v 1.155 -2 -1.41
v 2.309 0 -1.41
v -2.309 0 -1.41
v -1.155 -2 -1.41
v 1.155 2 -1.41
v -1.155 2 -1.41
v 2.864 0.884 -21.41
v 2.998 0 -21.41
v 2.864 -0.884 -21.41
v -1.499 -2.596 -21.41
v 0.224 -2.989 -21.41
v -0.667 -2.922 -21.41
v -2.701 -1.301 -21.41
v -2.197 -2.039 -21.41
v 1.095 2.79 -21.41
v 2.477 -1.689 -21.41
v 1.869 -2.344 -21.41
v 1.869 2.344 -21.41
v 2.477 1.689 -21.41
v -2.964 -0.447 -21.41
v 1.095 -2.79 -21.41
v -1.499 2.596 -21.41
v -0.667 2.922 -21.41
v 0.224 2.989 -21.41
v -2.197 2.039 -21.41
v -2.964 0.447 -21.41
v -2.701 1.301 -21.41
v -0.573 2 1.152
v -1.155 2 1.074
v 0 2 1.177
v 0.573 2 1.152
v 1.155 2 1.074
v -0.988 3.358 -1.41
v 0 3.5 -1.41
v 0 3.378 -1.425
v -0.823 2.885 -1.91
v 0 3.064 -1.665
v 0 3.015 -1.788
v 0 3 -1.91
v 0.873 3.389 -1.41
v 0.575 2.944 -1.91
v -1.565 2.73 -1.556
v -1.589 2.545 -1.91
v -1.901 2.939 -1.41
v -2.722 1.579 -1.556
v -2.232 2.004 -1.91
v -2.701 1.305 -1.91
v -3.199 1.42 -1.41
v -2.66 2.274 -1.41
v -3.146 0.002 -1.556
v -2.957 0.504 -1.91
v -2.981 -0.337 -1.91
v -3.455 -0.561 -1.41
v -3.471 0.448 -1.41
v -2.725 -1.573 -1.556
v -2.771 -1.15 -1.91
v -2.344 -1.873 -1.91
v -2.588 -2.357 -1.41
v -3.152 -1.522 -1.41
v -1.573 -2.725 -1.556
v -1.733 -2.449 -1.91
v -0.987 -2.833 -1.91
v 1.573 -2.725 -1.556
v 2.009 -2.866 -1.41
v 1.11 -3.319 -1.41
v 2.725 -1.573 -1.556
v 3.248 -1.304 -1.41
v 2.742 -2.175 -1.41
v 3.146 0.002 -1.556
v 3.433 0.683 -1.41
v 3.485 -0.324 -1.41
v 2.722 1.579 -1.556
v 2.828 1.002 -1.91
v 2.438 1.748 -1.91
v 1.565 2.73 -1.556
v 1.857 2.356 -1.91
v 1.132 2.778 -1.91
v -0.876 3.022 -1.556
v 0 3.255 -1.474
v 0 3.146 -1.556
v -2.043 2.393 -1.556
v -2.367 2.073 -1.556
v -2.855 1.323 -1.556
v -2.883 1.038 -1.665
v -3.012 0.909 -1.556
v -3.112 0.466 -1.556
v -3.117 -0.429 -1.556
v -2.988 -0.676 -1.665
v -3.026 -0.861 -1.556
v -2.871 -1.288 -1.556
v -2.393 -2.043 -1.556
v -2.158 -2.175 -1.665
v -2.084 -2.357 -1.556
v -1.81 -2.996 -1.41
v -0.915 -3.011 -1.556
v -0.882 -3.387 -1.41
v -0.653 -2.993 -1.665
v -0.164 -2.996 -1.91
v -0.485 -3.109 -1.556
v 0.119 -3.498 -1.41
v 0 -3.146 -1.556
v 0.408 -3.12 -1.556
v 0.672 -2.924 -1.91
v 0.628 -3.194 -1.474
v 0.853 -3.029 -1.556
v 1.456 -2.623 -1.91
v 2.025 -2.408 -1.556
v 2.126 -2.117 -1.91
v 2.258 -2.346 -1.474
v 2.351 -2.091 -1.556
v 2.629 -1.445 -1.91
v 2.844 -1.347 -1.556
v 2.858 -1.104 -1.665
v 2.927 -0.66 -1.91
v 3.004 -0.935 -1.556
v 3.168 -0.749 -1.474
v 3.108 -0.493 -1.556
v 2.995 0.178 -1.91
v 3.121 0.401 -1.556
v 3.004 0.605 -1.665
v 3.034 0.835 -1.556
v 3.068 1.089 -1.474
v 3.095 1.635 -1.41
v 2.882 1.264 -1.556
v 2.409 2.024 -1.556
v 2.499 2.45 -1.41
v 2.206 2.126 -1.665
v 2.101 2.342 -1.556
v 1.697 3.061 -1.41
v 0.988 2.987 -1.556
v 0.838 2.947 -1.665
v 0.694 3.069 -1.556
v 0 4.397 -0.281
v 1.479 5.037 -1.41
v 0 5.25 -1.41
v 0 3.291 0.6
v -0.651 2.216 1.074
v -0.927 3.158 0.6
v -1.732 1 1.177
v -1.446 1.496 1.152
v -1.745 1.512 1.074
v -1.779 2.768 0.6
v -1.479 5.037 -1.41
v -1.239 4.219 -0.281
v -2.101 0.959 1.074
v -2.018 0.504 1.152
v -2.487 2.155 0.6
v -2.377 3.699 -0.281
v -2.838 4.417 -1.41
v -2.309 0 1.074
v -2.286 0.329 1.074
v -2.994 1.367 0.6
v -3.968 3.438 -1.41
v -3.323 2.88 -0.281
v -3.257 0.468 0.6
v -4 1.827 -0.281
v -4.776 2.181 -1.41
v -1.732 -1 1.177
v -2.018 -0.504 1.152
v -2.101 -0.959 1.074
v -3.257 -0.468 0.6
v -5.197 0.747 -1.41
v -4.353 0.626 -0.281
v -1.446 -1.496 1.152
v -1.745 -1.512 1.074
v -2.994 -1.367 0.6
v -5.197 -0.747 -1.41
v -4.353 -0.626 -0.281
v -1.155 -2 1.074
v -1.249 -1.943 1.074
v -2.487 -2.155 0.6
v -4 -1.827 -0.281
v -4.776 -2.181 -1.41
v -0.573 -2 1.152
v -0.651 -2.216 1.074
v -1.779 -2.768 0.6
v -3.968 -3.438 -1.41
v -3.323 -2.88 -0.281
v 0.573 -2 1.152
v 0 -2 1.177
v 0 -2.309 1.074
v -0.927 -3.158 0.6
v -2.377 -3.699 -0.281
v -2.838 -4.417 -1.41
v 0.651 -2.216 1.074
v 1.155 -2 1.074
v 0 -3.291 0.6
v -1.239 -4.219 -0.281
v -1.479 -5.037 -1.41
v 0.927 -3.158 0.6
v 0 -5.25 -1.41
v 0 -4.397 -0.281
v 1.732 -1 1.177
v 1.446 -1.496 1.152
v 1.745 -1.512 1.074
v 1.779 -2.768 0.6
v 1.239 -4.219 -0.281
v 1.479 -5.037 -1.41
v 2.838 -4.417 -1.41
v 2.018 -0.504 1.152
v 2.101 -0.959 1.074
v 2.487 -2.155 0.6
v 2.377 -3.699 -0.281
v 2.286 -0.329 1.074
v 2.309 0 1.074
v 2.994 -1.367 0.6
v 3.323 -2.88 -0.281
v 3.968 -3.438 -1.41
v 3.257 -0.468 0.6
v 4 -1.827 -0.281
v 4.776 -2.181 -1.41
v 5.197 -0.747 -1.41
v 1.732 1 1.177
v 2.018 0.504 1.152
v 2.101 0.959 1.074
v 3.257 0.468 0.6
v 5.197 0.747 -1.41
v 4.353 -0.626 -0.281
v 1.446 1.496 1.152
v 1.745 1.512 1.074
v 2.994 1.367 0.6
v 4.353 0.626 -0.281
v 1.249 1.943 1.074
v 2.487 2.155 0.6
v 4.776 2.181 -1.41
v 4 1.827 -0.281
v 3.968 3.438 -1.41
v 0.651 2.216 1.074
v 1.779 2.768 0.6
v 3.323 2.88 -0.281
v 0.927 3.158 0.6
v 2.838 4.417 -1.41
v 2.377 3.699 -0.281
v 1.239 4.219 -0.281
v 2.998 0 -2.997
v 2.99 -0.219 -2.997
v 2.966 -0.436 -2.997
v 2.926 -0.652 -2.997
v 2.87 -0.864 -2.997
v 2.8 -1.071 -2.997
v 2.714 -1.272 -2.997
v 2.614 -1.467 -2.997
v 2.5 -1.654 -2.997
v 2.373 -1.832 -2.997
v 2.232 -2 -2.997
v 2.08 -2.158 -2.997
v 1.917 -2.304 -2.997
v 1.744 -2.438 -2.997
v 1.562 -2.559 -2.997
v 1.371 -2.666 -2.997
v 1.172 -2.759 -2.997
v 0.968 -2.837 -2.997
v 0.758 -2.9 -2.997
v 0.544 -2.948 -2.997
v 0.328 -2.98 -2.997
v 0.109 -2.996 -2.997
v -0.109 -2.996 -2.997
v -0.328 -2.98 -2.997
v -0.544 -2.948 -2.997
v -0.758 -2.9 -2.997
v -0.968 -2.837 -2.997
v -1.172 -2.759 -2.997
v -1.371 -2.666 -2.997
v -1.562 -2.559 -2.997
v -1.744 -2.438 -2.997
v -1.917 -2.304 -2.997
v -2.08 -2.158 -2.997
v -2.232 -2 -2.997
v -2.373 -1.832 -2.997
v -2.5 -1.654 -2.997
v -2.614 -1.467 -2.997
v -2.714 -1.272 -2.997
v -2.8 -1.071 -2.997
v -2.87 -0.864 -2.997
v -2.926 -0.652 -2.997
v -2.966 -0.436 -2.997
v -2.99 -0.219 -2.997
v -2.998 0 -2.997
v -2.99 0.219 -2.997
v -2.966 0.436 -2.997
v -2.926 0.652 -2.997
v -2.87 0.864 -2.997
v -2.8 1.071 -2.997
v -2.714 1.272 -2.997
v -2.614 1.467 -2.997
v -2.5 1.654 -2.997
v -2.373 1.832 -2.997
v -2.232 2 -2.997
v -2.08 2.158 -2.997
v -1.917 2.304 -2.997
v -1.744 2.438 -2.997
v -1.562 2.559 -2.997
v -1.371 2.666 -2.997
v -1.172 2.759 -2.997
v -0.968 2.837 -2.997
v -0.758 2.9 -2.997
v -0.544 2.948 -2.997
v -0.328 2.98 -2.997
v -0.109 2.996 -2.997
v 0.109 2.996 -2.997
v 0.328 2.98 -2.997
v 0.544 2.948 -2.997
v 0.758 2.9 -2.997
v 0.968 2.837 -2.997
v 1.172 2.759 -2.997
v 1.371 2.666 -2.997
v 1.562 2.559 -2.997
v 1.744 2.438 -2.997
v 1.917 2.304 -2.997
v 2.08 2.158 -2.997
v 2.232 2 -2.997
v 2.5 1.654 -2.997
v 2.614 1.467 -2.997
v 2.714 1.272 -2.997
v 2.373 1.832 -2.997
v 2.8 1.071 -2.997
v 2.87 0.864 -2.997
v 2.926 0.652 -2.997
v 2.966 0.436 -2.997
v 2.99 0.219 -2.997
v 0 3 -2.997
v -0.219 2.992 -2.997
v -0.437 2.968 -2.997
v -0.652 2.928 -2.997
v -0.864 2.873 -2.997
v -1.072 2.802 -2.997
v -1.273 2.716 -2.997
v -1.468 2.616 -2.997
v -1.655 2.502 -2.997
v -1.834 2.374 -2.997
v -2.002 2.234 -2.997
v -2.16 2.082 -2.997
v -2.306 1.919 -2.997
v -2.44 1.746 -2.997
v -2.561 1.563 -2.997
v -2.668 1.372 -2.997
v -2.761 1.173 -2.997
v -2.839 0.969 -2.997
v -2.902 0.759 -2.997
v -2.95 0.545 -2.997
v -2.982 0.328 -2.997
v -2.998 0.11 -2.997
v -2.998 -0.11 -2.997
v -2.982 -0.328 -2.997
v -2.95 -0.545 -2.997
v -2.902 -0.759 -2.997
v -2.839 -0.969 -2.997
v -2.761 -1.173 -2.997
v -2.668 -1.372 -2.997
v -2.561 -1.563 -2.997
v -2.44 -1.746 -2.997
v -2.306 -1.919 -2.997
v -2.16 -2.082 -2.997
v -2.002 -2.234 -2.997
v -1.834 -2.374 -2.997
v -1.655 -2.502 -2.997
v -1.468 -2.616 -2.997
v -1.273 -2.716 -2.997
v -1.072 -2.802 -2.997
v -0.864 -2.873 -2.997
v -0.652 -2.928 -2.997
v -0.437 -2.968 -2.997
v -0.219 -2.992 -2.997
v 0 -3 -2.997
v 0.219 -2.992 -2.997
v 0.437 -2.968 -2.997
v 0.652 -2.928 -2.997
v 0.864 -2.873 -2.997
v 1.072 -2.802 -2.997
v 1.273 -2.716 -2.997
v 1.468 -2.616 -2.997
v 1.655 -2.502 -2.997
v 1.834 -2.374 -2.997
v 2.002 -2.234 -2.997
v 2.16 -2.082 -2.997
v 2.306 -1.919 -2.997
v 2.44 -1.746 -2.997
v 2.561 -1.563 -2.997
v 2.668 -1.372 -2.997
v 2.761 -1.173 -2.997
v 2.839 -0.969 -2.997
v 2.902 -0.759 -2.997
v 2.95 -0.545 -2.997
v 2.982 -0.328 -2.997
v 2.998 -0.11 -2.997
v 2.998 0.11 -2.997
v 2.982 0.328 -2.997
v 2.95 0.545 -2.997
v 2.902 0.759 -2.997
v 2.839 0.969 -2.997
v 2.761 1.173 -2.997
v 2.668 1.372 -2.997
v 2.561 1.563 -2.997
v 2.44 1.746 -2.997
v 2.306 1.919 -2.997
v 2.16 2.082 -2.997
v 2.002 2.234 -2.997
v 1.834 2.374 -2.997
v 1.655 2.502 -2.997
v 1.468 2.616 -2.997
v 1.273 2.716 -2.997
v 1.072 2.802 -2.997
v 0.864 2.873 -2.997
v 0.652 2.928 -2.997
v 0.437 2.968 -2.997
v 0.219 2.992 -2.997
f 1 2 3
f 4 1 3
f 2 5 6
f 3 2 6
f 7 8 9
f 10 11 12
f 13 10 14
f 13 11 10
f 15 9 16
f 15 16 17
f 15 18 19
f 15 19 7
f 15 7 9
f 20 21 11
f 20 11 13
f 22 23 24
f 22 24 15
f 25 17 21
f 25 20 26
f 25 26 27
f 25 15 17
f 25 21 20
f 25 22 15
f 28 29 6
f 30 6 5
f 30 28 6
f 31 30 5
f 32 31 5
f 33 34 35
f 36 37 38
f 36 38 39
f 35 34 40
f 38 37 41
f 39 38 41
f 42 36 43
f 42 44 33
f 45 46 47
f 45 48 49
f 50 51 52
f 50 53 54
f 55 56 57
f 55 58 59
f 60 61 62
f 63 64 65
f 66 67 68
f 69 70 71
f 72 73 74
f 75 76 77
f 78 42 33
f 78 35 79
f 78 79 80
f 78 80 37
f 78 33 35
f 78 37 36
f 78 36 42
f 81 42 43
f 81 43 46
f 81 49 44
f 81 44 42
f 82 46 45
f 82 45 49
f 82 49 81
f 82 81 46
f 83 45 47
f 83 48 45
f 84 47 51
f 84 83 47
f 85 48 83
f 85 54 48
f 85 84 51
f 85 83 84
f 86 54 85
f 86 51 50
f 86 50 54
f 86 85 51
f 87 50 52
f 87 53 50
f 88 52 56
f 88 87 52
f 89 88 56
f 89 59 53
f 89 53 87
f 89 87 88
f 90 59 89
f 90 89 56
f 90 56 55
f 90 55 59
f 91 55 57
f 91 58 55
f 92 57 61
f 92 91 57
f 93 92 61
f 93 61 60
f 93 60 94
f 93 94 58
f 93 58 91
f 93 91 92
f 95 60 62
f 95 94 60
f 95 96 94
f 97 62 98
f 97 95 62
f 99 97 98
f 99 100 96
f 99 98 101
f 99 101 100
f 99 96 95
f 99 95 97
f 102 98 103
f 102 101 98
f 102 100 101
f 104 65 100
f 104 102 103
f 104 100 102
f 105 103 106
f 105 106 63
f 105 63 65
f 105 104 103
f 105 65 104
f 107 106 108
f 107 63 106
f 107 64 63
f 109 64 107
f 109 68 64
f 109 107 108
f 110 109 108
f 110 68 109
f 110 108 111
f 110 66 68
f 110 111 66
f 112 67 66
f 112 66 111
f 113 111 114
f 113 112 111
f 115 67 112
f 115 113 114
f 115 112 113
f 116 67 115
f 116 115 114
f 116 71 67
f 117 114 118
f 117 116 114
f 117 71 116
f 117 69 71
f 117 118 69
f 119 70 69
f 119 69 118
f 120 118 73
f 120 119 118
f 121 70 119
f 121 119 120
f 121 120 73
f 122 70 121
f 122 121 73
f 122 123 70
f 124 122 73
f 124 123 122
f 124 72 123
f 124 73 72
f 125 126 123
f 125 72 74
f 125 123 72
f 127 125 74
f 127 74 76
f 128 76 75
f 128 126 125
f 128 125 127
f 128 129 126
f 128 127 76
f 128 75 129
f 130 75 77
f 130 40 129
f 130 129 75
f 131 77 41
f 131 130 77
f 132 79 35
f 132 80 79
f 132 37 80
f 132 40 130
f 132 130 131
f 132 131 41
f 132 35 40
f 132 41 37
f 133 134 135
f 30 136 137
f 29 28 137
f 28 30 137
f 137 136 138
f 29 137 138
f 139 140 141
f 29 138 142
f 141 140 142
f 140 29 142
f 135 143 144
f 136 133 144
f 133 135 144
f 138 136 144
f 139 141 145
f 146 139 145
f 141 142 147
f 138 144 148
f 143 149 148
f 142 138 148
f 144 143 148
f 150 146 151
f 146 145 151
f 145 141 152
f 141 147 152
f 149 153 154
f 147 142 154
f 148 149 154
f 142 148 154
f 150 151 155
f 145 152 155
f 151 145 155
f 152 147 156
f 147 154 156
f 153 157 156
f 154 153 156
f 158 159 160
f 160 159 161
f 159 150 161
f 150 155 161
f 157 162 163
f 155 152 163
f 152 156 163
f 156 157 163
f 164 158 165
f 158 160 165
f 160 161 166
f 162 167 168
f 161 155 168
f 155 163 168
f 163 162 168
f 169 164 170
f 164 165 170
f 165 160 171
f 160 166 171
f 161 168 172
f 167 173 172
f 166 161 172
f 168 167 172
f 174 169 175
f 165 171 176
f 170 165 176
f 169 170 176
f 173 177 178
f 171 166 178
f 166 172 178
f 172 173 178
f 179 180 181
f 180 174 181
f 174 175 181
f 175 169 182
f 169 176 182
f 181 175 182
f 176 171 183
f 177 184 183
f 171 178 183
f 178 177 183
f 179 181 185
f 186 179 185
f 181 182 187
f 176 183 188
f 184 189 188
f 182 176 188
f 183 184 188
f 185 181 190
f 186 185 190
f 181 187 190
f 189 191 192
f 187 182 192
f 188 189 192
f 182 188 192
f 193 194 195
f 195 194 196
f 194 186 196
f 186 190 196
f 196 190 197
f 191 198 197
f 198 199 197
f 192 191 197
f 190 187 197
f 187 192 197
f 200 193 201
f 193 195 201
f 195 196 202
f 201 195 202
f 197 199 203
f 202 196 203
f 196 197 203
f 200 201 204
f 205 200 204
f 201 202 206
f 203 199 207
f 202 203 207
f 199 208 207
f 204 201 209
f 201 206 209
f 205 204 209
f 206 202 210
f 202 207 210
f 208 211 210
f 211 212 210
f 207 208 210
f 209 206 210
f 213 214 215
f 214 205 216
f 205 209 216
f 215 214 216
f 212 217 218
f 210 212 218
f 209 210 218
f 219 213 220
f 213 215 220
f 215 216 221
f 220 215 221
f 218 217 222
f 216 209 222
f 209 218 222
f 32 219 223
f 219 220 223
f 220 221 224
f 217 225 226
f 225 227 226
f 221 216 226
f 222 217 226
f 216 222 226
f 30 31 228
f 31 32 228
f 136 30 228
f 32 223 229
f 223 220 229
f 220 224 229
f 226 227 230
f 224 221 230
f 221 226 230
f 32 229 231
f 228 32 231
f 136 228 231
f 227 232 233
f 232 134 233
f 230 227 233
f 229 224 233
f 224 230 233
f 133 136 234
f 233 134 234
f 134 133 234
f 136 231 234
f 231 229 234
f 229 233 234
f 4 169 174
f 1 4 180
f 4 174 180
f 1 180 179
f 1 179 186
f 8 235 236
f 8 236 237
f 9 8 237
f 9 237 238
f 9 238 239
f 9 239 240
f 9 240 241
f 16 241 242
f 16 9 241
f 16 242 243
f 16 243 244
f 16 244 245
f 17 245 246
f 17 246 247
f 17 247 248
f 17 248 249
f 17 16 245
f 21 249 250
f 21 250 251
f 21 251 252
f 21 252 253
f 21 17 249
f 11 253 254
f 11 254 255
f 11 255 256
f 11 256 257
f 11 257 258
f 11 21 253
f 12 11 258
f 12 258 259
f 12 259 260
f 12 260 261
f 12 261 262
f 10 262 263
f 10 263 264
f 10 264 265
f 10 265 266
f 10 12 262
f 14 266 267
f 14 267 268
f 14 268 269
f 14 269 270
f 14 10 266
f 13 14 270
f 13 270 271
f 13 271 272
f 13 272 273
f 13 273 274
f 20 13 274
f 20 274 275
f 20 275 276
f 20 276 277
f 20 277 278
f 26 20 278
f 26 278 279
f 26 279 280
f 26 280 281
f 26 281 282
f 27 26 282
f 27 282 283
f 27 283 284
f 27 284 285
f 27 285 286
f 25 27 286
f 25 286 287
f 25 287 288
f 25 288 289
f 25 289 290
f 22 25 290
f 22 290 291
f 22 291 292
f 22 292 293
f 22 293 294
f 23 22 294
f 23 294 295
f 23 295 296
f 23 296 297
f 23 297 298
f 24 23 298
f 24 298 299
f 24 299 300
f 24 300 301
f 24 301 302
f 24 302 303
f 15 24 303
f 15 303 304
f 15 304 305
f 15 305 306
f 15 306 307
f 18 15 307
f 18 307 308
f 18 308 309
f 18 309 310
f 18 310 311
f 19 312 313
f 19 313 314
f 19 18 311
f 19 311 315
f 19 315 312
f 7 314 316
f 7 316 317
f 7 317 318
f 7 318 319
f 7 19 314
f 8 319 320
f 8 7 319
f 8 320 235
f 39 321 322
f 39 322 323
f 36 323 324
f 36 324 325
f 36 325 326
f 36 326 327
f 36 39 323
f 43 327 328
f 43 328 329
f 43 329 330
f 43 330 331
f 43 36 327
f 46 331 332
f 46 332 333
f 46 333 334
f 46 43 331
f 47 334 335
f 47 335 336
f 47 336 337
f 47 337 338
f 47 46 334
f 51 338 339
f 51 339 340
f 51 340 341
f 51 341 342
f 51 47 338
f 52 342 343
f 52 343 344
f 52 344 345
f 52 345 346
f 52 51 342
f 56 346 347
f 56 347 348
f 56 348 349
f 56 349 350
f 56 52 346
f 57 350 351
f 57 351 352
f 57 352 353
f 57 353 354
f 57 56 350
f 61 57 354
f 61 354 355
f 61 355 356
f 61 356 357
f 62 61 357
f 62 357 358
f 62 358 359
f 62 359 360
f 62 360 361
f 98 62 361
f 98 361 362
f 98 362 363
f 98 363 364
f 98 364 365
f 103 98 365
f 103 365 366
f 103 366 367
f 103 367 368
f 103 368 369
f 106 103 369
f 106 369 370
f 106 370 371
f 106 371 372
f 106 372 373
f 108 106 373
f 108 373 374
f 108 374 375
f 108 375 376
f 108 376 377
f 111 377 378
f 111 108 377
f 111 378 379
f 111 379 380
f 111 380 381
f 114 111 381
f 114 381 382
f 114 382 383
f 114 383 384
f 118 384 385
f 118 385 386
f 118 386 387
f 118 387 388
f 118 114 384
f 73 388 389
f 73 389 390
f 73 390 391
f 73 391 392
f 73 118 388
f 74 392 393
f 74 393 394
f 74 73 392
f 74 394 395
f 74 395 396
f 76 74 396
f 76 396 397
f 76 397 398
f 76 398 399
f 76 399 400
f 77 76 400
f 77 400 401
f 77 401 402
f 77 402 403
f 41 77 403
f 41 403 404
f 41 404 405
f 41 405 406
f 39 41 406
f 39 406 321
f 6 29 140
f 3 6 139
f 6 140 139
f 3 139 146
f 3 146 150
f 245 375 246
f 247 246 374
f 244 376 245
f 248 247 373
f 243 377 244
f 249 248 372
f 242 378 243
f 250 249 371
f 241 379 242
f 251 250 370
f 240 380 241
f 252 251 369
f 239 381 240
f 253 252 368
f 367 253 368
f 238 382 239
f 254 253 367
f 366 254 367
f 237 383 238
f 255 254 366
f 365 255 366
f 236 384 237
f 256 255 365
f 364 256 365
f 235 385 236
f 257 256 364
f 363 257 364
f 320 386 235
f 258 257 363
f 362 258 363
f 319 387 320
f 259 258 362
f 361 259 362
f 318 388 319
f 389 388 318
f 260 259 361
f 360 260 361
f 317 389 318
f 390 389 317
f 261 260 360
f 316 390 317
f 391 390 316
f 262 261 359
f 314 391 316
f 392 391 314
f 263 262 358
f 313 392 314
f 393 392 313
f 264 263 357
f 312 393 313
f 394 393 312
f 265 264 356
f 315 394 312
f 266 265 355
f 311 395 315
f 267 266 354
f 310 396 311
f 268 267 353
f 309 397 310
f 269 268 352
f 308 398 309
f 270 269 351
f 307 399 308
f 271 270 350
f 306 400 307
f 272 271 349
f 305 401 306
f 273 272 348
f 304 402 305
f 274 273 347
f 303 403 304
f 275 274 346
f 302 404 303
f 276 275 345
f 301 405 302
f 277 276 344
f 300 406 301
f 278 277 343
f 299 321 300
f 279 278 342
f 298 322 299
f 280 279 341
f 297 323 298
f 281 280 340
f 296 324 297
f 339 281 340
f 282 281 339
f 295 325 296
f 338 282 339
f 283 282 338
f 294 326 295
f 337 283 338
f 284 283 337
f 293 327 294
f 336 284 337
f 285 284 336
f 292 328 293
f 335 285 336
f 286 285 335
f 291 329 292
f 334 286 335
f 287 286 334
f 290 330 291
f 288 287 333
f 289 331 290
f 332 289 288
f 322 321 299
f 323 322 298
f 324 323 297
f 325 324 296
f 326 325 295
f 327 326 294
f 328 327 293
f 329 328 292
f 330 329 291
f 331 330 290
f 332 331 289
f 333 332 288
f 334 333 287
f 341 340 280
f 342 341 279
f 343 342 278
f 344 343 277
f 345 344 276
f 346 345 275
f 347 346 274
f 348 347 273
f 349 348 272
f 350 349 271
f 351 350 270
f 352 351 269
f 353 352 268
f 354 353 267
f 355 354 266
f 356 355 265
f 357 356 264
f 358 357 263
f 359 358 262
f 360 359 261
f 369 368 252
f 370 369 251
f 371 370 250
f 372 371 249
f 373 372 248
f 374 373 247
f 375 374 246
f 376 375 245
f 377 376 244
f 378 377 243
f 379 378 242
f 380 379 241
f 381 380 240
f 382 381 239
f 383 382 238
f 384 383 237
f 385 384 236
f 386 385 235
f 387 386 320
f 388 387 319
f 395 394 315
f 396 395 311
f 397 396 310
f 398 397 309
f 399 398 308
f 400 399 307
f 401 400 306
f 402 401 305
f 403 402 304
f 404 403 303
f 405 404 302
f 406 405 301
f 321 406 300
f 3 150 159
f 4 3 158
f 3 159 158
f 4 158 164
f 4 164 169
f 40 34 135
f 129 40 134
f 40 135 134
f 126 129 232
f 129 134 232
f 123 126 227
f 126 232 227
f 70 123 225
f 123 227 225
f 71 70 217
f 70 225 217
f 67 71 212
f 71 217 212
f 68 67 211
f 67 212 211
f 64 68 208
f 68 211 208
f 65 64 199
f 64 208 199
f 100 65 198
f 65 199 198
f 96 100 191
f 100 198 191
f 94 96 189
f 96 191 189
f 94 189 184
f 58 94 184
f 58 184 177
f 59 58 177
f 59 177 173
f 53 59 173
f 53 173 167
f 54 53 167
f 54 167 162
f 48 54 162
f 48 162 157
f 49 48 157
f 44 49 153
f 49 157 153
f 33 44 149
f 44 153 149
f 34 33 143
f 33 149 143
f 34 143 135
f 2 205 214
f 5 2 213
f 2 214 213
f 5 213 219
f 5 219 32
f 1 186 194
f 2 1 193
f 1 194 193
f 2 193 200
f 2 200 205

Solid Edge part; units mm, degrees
sketch "Sketch1" plane through (0, 0, 0) normal (1, 0, 0) x (0, 1, 0)
  line L0 (0, -1.4097) -> (0, 1.4097)
  arc A0 (0, 1.4097) -> (5.25, -1.4097) centre (0.36, -4.2176) cw
  line L1 (0, -1.4097) -> (5.25, -1.4097)
  dimension "D1" = 2.8194
  dimension "D2" = 5.6388
revolve "RevolvedProtrusion1" add sketch "Sketch1" angle 360 about axis through (0, 0, -14.7796) along (0, 0, 1)
sketch "Sketch2" plane through (0, 0, -1.4097) normal (0, 0, -1) x (0, 1, 0)
  circle A0 centre (0, 0) radius 3
  dimension "D1" = 6
extrude "Protrusion1" add sketch "Sketch2" along normal blind 20
sketch "Sketch3" plane through (0, 0, -21.4097) normal (0, 0, -1) x (1, 0, 0)
  circle A0 centre (0, 0) radius 2.9975
  dimension "D1" = 0.0025
extrude "Cutout1" cut sketch "Sketch3" against normal blind 18.4125 flip side to cut
sketch "Sketch4" plane through (-0.6032, 0.3606, 2.8194) normal (0, 0, 1) x (1, 0, 0)
  line L0 (-0.5515, 1.6394) -> (1.7579, 1.6394)
  line L1 (2.9126, -0.3606) -> (1.7579, 1.6394)
  line L2 (1.7579, -2.3606) -> (2.9126, -0.3606)
  line L3 (-0.5515, -2.3606) -> (1.7579, -2.3606)
  line L4 (-1.7062, -0.3606) -> (-0.5515, -2.3606)
  line L5 (-0.5515, 1.6394) -> (-1.7062, -0.3606)
extrude "ExtrudedCutout_11" cut sketch "Sketch4" against normal blind 4.2291
fillet "Round_3" radius 0.5 1 edges at (3, 0, -1.4097)
properties part number "182126"
